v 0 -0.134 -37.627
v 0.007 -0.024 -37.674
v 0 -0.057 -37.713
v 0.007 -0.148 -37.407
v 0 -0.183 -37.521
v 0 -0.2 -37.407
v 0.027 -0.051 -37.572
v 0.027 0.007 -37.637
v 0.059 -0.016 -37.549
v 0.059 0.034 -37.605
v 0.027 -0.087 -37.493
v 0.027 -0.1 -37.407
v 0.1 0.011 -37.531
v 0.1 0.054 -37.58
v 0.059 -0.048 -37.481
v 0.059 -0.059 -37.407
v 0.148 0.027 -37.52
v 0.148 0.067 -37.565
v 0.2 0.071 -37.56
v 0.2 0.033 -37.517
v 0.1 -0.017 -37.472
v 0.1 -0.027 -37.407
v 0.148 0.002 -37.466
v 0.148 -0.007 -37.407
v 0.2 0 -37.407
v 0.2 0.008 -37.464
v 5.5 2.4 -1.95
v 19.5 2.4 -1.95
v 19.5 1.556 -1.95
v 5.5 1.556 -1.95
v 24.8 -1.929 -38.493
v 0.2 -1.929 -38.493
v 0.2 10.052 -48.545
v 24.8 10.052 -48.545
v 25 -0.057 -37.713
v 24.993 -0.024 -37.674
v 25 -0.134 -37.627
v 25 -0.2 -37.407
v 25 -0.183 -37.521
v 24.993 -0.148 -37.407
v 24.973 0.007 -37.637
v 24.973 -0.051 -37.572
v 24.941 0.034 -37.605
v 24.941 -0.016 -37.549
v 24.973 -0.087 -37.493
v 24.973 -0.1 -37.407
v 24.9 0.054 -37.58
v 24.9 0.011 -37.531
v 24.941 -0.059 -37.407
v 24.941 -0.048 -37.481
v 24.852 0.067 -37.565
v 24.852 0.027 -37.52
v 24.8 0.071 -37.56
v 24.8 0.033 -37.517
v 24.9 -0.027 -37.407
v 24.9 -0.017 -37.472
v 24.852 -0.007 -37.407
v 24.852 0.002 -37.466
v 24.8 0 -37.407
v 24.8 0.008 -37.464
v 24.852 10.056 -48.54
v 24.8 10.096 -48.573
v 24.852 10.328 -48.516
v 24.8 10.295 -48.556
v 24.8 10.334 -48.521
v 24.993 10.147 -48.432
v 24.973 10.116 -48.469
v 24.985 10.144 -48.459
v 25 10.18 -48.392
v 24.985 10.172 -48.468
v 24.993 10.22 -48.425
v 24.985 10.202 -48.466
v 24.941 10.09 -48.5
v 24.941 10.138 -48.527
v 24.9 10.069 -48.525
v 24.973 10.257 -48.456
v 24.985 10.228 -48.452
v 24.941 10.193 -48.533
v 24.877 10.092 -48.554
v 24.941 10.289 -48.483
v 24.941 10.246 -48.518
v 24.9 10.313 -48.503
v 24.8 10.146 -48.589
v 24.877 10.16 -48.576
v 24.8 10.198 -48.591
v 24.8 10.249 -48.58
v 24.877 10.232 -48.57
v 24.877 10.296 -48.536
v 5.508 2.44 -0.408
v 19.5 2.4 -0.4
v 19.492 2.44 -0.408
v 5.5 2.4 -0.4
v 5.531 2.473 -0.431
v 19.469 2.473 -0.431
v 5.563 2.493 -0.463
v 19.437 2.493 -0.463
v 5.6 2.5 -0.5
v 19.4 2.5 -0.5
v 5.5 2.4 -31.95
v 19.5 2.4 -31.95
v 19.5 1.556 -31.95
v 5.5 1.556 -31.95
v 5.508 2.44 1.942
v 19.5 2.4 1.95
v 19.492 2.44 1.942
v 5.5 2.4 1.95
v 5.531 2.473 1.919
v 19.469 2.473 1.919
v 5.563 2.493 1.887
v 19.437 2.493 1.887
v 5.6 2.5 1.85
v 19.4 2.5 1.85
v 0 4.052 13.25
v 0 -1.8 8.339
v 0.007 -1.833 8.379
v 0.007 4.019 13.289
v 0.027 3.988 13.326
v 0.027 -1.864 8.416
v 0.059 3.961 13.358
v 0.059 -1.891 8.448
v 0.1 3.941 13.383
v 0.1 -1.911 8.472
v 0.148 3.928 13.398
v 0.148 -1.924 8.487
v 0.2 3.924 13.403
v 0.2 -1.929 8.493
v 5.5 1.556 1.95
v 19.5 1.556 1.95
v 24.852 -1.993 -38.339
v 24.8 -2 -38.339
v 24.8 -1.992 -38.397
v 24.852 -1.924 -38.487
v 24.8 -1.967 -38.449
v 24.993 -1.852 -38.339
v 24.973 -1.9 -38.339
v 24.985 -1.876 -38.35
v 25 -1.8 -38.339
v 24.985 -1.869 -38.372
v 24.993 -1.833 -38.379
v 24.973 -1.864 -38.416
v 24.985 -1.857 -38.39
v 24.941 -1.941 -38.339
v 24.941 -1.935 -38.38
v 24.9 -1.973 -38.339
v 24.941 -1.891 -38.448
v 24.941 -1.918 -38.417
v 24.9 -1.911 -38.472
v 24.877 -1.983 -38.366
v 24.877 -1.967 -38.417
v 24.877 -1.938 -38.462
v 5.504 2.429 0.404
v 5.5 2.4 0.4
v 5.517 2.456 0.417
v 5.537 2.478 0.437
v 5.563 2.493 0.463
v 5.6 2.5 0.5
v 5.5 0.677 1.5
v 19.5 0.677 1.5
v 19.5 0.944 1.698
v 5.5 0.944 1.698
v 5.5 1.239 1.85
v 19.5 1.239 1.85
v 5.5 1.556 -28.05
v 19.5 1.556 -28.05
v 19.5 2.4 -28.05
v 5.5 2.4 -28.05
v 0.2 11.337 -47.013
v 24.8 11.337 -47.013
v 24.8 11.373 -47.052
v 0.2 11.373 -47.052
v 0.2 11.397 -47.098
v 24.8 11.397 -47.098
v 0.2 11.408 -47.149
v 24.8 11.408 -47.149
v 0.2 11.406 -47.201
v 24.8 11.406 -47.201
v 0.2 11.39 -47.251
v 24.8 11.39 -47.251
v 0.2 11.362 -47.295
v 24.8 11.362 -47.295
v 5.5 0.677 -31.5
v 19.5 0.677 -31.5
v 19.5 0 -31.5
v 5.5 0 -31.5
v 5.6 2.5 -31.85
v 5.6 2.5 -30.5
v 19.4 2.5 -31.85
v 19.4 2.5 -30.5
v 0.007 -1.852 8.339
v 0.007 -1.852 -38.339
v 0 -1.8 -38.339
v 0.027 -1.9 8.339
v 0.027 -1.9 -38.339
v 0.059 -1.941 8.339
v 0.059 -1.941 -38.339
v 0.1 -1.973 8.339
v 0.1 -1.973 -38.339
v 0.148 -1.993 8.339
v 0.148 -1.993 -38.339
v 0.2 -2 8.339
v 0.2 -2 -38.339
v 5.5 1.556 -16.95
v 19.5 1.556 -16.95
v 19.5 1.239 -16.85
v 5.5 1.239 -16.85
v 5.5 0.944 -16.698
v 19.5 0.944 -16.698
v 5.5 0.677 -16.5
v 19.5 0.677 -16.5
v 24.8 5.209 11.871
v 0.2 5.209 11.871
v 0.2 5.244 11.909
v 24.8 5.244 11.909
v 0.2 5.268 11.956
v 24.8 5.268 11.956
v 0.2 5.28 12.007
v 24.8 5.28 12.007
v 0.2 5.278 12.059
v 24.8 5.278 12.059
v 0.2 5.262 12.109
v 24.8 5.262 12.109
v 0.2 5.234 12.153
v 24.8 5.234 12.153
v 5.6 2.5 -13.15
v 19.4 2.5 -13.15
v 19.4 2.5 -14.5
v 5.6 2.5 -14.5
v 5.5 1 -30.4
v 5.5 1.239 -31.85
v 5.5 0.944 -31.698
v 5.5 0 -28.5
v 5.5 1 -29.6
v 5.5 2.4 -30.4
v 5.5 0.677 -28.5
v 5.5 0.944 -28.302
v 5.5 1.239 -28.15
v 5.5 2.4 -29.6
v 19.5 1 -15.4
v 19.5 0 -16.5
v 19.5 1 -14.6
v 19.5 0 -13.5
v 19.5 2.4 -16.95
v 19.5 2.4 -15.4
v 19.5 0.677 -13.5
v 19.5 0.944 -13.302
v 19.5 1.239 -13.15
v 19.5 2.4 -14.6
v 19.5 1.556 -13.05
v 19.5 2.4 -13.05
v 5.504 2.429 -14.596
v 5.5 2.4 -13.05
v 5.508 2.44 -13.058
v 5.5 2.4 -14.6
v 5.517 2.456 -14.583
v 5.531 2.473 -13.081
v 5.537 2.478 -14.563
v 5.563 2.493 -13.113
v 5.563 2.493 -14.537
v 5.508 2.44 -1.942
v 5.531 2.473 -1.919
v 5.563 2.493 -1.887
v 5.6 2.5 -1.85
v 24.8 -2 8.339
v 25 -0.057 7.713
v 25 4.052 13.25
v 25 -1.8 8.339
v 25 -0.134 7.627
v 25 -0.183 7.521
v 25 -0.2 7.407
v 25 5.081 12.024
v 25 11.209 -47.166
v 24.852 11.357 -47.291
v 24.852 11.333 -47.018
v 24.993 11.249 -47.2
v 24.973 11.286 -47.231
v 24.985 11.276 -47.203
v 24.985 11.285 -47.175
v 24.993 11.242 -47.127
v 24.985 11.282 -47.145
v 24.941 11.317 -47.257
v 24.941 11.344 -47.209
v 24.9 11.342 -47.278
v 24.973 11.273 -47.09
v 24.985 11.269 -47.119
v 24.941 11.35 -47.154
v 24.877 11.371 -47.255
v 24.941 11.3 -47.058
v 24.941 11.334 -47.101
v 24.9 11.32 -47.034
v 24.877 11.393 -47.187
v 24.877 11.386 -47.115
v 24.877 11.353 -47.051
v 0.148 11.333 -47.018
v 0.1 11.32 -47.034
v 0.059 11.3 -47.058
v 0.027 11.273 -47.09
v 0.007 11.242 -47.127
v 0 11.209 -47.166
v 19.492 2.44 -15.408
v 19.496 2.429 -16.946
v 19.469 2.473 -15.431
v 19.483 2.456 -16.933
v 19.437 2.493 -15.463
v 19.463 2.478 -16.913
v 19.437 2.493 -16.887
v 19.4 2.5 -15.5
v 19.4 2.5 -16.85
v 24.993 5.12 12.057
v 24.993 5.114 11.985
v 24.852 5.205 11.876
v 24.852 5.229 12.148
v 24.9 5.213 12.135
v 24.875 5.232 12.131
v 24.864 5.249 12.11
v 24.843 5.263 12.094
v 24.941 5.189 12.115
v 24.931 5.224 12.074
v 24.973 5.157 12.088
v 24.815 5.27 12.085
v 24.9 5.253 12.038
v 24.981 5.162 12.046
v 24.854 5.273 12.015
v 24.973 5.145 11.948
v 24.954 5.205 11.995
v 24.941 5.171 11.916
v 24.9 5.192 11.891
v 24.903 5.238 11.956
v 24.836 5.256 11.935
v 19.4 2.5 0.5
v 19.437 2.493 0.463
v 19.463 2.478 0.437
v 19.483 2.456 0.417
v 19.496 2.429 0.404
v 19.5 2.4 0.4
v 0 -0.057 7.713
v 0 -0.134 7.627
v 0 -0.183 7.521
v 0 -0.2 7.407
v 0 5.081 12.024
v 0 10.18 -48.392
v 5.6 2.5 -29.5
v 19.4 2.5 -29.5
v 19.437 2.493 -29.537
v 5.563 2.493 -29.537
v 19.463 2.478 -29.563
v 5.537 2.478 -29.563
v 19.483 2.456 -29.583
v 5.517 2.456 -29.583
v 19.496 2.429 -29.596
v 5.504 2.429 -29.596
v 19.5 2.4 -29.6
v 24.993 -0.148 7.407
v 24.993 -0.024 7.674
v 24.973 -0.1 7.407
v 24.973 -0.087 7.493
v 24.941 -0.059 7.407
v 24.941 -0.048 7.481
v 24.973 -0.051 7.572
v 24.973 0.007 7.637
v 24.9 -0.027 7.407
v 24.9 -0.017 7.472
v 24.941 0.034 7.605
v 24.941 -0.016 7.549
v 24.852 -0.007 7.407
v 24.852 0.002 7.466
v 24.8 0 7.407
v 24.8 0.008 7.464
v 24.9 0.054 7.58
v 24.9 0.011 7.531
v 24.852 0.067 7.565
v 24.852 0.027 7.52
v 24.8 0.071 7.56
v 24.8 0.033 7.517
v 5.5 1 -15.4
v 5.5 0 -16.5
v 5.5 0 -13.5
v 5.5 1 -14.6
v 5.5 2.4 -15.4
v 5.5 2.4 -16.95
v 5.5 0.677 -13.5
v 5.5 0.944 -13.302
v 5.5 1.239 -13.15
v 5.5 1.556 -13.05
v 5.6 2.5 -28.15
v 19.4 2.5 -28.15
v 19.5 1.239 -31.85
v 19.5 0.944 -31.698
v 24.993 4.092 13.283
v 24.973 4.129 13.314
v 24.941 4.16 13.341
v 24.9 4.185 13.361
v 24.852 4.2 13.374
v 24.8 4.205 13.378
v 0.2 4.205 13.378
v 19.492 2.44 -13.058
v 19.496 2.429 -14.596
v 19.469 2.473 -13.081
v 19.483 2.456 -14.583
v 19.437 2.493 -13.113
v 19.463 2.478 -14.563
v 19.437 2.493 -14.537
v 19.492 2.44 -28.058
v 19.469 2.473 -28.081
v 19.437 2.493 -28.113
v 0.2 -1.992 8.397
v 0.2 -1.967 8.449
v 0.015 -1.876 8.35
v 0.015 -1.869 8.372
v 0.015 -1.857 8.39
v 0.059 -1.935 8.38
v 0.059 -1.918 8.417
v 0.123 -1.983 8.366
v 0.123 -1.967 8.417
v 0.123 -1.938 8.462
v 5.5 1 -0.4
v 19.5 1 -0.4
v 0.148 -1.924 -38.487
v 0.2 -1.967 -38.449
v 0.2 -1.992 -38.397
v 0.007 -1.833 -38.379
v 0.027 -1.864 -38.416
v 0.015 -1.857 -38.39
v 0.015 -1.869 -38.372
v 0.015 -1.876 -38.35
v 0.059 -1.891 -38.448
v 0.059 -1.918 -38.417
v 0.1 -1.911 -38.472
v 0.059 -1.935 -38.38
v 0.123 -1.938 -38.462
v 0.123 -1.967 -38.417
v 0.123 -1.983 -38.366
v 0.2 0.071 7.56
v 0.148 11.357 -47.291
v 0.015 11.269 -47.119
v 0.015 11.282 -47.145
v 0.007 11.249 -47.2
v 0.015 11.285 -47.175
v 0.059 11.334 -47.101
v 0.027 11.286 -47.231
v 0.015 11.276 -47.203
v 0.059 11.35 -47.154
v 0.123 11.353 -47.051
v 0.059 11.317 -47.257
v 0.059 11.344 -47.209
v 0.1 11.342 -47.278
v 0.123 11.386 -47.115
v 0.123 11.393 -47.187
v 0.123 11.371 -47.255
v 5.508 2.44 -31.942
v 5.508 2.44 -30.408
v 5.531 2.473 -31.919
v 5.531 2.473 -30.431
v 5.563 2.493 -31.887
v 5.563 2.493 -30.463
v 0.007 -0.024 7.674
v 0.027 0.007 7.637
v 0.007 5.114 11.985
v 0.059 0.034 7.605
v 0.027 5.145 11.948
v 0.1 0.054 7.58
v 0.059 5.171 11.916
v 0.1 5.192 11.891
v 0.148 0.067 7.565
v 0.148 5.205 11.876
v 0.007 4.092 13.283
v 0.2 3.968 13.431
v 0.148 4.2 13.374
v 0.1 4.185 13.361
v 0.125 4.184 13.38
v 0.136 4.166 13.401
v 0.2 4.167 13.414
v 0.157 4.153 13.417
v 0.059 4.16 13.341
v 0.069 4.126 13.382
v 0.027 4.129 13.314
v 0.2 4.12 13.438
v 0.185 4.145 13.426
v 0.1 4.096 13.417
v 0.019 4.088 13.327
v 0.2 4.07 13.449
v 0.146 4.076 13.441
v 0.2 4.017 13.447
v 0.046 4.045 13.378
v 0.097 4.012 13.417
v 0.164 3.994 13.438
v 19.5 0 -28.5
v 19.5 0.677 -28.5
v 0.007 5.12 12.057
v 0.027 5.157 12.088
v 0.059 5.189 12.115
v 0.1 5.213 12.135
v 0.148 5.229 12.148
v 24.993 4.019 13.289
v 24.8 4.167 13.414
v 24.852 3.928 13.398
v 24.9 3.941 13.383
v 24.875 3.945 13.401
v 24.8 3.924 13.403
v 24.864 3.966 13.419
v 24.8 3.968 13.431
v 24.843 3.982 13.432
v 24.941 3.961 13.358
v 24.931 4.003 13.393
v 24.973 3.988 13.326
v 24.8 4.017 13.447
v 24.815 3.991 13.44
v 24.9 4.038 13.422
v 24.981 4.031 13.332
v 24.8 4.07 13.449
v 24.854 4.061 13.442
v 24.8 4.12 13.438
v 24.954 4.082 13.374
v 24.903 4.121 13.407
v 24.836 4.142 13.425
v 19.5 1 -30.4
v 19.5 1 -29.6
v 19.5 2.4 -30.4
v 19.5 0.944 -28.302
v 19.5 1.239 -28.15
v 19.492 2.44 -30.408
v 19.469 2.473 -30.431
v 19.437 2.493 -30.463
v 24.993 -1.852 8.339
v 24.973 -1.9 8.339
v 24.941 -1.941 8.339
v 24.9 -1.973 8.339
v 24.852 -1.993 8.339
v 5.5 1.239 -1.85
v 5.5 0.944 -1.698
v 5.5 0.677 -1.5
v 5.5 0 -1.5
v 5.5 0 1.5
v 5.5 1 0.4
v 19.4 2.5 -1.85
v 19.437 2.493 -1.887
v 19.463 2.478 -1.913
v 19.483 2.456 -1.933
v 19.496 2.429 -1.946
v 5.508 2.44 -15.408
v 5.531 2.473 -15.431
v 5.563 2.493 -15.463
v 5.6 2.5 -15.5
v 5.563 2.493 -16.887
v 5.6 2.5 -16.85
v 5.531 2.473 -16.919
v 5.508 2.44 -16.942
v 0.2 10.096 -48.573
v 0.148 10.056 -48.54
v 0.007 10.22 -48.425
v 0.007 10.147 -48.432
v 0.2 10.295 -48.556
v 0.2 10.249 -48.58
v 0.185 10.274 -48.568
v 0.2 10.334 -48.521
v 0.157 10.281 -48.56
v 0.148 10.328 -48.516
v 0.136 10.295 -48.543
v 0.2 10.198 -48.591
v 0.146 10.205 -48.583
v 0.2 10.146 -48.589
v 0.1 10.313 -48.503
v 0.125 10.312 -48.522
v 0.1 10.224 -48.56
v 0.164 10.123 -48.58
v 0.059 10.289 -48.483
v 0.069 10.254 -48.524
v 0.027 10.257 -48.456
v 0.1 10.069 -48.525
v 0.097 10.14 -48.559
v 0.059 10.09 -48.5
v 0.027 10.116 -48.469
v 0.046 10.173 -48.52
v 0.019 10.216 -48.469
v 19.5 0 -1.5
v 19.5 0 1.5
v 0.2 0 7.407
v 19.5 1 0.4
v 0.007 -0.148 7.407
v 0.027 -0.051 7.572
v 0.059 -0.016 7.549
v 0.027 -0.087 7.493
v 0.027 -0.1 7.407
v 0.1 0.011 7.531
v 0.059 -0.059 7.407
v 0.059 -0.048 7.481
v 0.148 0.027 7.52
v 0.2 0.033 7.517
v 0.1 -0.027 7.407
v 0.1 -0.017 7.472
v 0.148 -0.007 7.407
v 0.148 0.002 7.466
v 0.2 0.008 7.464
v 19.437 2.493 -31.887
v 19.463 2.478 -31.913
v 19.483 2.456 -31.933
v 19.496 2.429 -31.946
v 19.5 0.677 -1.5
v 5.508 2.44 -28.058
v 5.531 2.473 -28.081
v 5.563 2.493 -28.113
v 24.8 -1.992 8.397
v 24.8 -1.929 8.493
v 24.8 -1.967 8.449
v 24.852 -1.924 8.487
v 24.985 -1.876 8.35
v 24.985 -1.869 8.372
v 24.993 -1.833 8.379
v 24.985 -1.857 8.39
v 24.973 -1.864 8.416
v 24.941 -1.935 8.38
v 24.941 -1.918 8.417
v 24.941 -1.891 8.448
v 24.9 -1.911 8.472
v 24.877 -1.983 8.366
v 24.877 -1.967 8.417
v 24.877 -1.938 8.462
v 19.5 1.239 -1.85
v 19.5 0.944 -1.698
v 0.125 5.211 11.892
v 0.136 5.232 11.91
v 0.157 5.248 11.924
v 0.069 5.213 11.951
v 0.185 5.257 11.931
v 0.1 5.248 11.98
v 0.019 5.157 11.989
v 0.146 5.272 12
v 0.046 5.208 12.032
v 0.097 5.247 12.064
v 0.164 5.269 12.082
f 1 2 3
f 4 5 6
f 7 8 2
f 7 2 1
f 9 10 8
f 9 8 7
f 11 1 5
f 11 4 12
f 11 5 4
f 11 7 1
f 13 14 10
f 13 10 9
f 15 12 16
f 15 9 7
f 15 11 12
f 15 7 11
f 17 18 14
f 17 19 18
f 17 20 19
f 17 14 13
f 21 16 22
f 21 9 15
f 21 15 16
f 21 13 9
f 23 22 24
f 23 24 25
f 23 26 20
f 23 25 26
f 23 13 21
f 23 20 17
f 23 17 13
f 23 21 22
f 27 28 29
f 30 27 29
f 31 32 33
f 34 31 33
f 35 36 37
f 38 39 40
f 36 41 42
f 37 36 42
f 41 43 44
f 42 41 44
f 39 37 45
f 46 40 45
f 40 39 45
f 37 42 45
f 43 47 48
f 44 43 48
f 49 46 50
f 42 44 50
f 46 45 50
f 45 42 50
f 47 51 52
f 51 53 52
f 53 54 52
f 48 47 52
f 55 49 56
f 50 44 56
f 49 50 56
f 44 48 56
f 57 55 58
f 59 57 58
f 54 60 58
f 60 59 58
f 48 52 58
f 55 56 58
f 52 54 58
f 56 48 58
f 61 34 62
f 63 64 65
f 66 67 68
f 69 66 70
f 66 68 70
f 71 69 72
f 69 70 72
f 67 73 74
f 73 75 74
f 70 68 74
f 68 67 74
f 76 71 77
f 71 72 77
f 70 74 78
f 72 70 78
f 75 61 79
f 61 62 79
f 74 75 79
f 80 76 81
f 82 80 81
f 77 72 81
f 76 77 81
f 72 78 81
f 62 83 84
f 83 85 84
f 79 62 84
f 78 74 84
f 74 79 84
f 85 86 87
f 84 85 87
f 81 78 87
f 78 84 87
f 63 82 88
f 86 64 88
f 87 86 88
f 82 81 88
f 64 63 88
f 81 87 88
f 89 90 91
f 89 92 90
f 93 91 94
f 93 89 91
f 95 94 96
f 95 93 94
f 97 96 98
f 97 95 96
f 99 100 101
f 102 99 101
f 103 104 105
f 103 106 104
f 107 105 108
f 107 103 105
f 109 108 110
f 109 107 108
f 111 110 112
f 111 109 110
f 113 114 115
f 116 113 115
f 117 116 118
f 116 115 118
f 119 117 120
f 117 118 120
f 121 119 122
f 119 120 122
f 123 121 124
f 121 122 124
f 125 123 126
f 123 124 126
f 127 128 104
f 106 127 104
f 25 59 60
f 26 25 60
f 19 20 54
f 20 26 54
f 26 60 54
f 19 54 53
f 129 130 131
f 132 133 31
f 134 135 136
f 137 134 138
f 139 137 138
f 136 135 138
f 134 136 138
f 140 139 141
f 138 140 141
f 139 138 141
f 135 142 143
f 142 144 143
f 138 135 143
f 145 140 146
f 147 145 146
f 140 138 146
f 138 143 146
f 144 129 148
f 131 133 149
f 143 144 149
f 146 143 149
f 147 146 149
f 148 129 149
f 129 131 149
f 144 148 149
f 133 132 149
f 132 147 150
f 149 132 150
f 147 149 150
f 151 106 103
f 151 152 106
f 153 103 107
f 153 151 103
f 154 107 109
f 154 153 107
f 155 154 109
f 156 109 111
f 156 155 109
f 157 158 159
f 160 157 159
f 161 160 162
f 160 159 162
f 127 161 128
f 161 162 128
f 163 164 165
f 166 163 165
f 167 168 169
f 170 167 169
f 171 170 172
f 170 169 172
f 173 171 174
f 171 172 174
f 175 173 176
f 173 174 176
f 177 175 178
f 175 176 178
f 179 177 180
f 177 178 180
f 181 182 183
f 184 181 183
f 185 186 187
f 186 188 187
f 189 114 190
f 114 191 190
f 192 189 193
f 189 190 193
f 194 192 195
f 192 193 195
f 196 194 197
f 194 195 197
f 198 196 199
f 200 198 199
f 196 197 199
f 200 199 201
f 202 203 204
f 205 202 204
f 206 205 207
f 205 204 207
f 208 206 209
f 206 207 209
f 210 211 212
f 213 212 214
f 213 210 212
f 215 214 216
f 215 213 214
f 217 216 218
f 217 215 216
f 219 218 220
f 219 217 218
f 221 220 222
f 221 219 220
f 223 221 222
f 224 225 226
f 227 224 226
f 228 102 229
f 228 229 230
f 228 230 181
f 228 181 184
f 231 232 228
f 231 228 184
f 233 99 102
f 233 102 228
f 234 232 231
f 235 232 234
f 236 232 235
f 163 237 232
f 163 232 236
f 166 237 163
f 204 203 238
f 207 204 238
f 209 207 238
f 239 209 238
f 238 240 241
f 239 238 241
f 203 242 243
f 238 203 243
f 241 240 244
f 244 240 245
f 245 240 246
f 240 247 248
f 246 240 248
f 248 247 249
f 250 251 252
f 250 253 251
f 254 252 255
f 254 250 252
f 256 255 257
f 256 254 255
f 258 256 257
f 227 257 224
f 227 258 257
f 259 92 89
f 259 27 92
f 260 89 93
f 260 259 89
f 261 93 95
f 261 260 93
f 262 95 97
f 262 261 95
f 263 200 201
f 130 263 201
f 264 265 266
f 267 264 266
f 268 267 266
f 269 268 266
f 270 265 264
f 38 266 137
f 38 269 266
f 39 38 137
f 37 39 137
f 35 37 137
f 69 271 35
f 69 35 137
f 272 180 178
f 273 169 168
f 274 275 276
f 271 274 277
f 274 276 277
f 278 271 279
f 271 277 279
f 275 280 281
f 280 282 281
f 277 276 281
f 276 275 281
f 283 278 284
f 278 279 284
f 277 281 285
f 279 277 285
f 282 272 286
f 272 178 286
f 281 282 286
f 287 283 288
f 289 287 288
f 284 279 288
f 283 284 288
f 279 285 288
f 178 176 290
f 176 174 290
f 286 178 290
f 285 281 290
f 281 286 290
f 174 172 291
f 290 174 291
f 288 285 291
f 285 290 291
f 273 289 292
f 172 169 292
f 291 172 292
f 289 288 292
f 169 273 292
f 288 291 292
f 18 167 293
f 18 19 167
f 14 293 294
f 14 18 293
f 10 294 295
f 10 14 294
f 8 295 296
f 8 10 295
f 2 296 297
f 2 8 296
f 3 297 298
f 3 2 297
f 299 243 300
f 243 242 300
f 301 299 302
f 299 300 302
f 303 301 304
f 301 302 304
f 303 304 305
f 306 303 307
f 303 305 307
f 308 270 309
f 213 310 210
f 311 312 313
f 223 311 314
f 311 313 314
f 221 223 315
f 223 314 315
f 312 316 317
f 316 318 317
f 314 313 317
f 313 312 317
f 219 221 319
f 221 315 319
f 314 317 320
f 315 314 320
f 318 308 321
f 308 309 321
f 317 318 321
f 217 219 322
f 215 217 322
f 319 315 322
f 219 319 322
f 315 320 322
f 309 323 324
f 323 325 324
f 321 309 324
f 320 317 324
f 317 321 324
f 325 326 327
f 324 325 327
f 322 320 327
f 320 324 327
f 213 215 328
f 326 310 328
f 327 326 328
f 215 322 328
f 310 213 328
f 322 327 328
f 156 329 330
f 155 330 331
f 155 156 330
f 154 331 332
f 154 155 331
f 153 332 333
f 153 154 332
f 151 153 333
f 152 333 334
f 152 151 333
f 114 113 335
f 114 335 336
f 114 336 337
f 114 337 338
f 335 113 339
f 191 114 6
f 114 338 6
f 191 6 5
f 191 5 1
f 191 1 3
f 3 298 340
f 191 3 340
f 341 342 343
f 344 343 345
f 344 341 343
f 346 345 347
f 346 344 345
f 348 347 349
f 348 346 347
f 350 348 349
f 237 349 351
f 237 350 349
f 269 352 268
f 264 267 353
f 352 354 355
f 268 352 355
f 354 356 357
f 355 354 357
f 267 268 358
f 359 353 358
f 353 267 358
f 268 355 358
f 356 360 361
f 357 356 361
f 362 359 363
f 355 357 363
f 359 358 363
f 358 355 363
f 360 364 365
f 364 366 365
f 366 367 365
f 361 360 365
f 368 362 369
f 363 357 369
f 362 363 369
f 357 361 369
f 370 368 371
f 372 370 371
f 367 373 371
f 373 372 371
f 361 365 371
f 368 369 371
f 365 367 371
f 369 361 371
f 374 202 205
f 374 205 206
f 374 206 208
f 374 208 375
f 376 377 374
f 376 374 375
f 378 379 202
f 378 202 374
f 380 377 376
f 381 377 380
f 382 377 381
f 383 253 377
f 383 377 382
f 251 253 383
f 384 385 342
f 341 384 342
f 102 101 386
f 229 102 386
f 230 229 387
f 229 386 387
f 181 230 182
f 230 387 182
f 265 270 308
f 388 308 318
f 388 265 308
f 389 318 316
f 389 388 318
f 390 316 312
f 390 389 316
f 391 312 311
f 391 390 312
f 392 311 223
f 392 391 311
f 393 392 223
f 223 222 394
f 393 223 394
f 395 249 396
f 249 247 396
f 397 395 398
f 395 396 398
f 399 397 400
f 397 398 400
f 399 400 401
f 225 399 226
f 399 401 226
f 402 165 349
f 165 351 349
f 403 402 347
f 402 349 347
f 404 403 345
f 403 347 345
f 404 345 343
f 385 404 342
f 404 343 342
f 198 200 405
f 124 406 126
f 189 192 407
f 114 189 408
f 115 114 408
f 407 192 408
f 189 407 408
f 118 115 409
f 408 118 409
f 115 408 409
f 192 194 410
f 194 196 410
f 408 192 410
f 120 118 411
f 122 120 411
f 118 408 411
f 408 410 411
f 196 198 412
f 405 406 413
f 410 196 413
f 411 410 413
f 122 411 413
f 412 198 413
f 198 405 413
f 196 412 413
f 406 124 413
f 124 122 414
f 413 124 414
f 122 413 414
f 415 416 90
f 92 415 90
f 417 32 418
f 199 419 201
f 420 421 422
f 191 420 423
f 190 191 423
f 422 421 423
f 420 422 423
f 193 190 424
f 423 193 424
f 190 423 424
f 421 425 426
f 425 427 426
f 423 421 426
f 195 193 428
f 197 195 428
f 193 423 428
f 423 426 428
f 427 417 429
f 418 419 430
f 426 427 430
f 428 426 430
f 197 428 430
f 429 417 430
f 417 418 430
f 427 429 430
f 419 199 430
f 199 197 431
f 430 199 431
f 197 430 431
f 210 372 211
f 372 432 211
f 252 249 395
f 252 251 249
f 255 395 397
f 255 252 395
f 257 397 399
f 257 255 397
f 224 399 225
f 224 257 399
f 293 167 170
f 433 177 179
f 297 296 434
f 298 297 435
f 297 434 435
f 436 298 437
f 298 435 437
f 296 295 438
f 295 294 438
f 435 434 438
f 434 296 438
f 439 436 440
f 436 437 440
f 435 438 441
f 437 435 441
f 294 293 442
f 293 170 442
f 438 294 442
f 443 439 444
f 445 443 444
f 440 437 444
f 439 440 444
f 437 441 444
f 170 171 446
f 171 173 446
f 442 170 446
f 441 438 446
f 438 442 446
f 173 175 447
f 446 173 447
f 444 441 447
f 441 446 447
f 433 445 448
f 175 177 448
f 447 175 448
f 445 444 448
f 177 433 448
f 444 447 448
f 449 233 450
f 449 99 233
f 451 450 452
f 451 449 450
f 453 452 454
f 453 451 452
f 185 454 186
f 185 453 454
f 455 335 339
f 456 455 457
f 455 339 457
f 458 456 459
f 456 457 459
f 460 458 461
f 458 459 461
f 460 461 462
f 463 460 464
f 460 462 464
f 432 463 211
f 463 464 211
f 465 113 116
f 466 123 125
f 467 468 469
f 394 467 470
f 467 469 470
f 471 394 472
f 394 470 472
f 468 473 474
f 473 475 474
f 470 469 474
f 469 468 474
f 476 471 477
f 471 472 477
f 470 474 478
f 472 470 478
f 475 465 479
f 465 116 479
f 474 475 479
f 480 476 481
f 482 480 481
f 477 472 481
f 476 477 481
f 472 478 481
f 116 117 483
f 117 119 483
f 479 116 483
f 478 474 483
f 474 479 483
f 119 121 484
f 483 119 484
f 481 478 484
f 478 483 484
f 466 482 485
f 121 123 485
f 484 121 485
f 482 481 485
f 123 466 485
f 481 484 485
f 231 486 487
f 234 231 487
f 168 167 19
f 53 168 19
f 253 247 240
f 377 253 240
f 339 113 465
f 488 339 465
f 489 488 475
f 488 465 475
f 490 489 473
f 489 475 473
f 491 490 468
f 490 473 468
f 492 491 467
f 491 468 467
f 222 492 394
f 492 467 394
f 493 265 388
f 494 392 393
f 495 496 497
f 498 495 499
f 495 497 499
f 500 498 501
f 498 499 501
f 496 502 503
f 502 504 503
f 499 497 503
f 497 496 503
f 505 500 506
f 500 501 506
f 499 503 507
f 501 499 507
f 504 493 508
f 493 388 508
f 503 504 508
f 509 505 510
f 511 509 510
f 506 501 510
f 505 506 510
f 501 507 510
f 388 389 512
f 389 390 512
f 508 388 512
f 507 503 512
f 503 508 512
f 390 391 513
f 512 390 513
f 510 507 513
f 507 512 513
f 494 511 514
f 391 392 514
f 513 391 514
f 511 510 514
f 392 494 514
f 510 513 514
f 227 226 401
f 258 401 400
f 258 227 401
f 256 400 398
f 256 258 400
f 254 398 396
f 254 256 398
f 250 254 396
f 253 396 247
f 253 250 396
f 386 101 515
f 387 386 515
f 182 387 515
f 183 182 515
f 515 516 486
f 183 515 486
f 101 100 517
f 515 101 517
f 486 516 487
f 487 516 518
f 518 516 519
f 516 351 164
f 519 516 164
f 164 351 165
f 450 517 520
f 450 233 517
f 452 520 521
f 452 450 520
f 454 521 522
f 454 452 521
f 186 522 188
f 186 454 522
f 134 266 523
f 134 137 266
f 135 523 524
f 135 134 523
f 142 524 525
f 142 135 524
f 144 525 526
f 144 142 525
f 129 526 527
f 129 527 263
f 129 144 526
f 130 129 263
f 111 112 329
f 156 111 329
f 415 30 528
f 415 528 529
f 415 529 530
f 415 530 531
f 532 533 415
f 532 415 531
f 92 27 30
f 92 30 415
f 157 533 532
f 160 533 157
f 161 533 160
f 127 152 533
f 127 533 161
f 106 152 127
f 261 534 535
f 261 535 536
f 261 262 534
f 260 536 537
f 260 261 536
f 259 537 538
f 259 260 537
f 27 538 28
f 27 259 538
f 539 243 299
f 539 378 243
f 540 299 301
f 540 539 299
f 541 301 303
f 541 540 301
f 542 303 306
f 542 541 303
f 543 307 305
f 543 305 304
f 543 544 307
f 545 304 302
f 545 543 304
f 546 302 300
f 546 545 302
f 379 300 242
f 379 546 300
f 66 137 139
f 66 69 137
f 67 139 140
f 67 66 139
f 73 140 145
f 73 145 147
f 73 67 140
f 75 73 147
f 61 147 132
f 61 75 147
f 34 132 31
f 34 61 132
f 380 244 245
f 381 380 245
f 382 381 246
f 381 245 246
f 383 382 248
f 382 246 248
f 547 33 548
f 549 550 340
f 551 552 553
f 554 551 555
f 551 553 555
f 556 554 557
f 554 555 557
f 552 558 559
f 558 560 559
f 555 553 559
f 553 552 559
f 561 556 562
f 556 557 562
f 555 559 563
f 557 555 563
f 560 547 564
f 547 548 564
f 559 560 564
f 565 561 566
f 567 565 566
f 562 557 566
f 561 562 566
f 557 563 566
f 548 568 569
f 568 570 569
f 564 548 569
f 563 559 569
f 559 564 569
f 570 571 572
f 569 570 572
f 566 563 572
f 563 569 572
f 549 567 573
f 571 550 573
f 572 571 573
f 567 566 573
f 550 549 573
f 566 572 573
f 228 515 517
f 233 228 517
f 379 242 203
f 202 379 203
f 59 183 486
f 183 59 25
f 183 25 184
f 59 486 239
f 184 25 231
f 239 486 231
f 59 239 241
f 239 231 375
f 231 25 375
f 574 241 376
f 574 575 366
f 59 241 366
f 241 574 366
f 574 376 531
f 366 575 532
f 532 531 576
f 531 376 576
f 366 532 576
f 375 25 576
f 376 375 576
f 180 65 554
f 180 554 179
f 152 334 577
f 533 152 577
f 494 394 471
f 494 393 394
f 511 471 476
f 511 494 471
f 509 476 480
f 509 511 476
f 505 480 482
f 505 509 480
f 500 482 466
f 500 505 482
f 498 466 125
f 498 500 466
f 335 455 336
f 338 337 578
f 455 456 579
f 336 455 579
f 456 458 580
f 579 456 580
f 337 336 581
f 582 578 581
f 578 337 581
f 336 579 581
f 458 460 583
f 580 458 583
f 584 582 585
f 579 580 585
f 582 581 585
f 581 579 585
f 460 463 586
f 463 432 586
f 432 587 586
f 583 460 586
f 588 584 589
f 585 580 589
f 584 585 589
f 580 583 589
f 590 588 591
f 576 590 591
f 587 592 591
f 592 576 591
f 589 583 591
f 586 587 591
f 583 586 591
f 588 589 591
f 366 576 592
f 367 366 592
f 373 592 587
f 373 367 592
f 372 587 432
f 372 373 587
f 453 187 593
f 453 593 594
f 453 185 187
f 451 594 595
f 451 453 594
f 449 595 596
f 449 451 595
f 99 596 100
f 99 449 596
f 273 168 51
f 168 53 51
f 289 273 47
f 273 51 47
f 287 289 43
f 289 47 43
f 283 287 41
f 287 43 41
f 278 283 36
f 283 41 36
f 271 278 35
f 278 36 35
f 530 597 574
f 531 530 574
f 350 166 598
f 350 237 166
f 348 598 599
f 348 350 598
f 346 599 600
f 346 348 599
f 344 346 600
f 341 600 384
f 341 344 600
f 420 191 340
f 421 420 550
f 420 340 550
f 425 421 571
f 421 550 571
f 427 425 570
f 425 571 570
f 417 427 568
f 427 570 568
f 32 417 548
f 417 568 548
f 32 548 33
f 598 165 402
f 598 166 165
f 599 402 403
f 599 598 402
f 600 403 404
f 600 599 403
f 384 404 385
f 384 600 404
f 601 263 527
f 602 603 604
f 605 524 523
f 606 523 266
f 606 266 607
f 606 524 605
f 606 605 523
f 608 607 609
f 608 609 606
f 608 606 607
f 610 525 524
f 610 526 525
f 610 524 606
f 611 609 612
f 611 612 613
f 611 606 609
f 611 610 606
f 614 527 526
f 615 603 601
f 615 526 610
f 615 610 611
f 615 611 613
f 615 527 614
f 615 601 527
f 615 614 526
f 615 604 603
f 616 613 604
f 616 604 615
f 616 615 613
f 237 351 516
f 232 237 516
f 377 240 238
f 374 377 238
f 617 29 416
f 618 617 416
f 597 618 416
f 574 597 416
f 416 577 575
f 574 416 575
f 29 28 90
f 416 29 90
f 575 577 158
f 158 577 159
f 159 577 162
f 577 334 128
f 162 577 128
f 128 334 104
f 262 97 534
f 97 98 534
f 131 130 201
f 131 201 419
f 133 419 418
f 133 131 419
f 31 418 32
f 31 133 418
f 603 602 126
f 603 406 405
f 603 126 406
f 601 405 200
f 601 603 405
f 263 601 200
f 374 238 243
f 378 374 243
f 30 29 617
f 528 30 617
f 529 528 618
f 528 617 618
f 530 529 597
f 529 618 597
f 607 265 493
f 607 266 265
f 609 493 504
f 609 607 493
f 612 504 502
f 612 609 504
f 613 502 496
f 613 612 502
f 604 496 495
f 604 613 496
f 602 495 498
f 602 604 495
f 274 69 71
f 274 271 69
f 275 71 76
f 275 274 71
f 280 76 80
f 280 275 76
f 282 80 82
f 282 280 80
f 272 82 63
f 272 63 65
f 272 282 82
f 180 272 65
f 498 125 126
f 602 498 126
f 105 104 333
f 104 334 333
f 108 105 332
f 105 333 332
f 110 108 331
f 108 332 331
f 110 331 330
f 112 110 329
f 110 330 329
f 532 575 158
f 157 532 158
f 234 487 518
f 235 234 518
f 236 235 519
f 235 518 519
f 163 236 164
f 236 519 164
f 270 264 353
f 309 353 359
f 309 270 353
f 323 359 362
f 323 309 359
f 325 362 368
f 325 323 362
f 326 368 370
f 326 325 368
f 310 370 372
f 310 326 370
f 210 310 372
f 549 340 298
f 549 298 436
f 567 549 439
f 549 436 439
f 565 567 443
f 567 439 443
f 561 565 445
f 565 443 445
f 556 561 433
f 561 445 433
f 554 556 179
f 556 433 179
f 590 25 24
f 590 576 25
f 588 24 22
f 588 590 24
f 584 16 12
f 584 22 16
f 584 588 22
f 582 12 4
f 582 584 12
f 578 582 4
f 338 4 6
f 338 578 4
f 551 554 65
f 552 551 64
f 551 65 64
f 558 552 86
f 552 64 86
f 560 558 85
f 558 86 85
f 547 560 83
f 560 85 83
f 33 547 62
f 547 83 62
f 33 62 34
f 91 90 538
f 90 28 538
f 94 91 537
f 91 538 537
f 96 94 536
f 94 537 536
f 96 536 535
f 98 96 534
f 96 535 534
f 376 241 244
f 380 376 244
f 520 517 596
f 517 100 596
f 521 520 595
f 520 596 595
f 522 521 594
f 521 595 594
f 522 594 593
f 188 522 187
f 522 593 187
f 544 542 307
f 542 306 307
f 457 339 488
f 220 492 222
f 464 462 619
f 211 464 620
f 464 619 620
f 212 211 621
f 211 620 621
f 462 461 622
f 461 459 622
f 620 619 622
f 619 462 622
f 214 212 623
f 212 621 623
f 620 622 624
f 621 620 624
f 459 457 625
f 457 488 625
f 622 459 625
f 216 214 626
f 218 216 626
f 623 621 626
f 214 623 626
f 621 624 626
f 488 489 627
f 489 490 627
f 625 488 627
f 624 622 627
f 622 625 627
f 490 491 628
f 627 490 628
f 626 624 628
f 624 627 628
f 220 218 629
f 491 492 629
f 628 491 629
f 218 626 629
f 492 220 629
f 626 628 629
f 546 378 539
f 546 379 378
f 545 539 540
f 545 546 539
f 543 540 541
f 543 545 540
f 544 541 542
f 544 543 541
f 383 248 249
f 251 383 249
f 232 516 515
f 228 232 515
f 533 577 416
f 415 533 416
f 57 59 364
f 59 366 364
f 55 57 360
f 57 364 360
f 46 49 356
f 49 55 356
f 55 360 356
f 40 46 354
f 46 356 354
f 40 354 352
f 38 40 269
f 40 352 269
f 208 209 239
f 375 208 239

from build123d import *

# Parameters (mm, degrees)
EXTRUDE_1_DEPTH        = 25
EXTRUDE_START          = -5.5
EXTRUDE_2_DEPTH        = 14
PATTERN_LINEAR_1_COUNT = 3
PATTERN_LINEAR_1_PITCH = 15
FILLET_1_R             = 0.1
FILLET_2_R             = 0.2


with BuildPart() as part:
    # 草图1 → 凸台-拉伸1 (new body)
    with BuildSketch(Plane(origin=(0, 0, 0), x_dir=(0, 0, -1), z_dir=(1, 0, 0))):
        Polygon((0, 0), (-7.5, 0), (-11.999513268, 5.362311102), (-13.531602154, 4.076735882), (-8.432615316, -2), (0, -2), (38.432615316, -2), (48.673903032, 10.205091427), (47.141814145, 11.490666647), (37.5, 0), align=None)
    extrude(amount=EXTRUDE_1_DEPTH)

    # 草图2 → 凸台-拉伸2 (add)
    with BuildSketch(Plane(origin=(25, 0, 0), x_dir=(0, 0, -1), z_dir=(1, 0, 0)).offset(EXTRUDE_START)):
        with BuildLine():
            Line((1.5, 0), (-1.5, 0))
            Line((-1.5, 0), (-1.5, 0.677124344))
            ThreePointArc((-1.5, 0.677124344), (-1.780042303, 1.088161527), (-1.95, 1.555590279))
            Line((-1.95, 1.555590279), (-1.95, 2.5))
            Line((-1.95, 2.5), (-0.4, 2.5))
            Line((-0.4, 2.5), (-0.4, 1))
            Line((-0.4, 1), (0.4, 1))
            Line((0.4, 1), (0.4, 2.5))
            Line((0.4, 2.5), (1.95, 2.5))
            Line((1.95, 2.5), (1.95, 1.555590279))
            ThreePointArc((1.95, 1.555590279), (1.780042303, 1.088161527), (1.5, 0.677124344))
            Line((1.5, 0.677124344), (1.5, 0))
        make_face()
    extrude_2 = extrude(amount=-EXTRUDE_2_DEPTH)

    # 阵列(线性)1: 凸台-拉伸2 ×3
    with Locations(*[(0, 0, -i * PATTERN_LINEAR_1_PITCH) for i in range(1, PATTERN_LINEAR_1_COUNT)]):
        add(extrude_2)

    # 圆角1
    fillet_1_edges = [part.edges().sort_by_distance(p)[0] for p in [
        (12.5, 2.5, 0.4),
        (5.5, 2.5, -1.175),
        (12.5, 2.5, -0.4),
        (12.5, 2.5, -1.95),
        (5.5, 2.5, 1.175),
        (12.5, 2.5, 1.95),
        (19.5, 2.5, 1.175),
        (19.5, 2.5, -1.175),
        (12.5, 2.5, -14.6),
        (5.5, 2.5, -16.175),
        (12.5, 2.5, -15.4),
        (12.5, 2.5, -16.95),
        (5.5, 2.5, -13.825),
        (12.5, 2.5, -13.05),
        (19.5, 2.5, -13.825),
        (19.5, 2.5, -16.175),
        (12.5, 2.5, -29.6),
        (5.5, 2.5, -31.175),
        (12.5, 2.5, -30.4),
        (12.5, 2.5, -31.95),
        (5.5, 2.5, -28.825),
        (12.5, 2.5, -28.05),
        (19.5, 2.5, -28.825),
        (19.5, 2.5, -31.175),
    ]]
    fillet(fillet_1_edges, radius=FILLET_1_R)

    # 圆角2
    fillet_2_edges = [part.edges().sort_by_distance(p)[0] for p in [
        (25, 2.681155551, 9.749756634),
        (0, 4.102545714, -43.553259174),
        (0, -2, -15),
        (0, 1.038367941, 10.982108735),
        (0, 4.719523492, 12.765557711),
        (0, 2.681155551, 9.749756634),
        (0, 0, -15),
        (25, 4.719523492, 12.765557711),
        (25, 1.038367941, 10.982108735),
        (12.5, 0, -37.5),
        (12.5, 11.490666647, -47.141814145),
        (12.5, 10.205091427, -48.673903032),
        (12.5, -2, -38.432615316),
        (12.5, -2, 8.432615316),
        (12.5, 4.076735882, 13.531602154),
        (12.5, 5.362311102, 11.999513268),
        (12.5, 0, 7.5),
        (25, -2, -15),
        (25, 4.102545714, -43.553259174),
        (25, 10.847879037, -47.907858588),
        (25, 5.745333323, -42.320907073),
        (25, 0, -15),
        (0, 5.745333323, -42.320907073),
        (0, 10.847879037, -47.907858588),
    ]]
    fillet(fillet_2_edges, radius=FILLET_2_R)


solid = part.part
